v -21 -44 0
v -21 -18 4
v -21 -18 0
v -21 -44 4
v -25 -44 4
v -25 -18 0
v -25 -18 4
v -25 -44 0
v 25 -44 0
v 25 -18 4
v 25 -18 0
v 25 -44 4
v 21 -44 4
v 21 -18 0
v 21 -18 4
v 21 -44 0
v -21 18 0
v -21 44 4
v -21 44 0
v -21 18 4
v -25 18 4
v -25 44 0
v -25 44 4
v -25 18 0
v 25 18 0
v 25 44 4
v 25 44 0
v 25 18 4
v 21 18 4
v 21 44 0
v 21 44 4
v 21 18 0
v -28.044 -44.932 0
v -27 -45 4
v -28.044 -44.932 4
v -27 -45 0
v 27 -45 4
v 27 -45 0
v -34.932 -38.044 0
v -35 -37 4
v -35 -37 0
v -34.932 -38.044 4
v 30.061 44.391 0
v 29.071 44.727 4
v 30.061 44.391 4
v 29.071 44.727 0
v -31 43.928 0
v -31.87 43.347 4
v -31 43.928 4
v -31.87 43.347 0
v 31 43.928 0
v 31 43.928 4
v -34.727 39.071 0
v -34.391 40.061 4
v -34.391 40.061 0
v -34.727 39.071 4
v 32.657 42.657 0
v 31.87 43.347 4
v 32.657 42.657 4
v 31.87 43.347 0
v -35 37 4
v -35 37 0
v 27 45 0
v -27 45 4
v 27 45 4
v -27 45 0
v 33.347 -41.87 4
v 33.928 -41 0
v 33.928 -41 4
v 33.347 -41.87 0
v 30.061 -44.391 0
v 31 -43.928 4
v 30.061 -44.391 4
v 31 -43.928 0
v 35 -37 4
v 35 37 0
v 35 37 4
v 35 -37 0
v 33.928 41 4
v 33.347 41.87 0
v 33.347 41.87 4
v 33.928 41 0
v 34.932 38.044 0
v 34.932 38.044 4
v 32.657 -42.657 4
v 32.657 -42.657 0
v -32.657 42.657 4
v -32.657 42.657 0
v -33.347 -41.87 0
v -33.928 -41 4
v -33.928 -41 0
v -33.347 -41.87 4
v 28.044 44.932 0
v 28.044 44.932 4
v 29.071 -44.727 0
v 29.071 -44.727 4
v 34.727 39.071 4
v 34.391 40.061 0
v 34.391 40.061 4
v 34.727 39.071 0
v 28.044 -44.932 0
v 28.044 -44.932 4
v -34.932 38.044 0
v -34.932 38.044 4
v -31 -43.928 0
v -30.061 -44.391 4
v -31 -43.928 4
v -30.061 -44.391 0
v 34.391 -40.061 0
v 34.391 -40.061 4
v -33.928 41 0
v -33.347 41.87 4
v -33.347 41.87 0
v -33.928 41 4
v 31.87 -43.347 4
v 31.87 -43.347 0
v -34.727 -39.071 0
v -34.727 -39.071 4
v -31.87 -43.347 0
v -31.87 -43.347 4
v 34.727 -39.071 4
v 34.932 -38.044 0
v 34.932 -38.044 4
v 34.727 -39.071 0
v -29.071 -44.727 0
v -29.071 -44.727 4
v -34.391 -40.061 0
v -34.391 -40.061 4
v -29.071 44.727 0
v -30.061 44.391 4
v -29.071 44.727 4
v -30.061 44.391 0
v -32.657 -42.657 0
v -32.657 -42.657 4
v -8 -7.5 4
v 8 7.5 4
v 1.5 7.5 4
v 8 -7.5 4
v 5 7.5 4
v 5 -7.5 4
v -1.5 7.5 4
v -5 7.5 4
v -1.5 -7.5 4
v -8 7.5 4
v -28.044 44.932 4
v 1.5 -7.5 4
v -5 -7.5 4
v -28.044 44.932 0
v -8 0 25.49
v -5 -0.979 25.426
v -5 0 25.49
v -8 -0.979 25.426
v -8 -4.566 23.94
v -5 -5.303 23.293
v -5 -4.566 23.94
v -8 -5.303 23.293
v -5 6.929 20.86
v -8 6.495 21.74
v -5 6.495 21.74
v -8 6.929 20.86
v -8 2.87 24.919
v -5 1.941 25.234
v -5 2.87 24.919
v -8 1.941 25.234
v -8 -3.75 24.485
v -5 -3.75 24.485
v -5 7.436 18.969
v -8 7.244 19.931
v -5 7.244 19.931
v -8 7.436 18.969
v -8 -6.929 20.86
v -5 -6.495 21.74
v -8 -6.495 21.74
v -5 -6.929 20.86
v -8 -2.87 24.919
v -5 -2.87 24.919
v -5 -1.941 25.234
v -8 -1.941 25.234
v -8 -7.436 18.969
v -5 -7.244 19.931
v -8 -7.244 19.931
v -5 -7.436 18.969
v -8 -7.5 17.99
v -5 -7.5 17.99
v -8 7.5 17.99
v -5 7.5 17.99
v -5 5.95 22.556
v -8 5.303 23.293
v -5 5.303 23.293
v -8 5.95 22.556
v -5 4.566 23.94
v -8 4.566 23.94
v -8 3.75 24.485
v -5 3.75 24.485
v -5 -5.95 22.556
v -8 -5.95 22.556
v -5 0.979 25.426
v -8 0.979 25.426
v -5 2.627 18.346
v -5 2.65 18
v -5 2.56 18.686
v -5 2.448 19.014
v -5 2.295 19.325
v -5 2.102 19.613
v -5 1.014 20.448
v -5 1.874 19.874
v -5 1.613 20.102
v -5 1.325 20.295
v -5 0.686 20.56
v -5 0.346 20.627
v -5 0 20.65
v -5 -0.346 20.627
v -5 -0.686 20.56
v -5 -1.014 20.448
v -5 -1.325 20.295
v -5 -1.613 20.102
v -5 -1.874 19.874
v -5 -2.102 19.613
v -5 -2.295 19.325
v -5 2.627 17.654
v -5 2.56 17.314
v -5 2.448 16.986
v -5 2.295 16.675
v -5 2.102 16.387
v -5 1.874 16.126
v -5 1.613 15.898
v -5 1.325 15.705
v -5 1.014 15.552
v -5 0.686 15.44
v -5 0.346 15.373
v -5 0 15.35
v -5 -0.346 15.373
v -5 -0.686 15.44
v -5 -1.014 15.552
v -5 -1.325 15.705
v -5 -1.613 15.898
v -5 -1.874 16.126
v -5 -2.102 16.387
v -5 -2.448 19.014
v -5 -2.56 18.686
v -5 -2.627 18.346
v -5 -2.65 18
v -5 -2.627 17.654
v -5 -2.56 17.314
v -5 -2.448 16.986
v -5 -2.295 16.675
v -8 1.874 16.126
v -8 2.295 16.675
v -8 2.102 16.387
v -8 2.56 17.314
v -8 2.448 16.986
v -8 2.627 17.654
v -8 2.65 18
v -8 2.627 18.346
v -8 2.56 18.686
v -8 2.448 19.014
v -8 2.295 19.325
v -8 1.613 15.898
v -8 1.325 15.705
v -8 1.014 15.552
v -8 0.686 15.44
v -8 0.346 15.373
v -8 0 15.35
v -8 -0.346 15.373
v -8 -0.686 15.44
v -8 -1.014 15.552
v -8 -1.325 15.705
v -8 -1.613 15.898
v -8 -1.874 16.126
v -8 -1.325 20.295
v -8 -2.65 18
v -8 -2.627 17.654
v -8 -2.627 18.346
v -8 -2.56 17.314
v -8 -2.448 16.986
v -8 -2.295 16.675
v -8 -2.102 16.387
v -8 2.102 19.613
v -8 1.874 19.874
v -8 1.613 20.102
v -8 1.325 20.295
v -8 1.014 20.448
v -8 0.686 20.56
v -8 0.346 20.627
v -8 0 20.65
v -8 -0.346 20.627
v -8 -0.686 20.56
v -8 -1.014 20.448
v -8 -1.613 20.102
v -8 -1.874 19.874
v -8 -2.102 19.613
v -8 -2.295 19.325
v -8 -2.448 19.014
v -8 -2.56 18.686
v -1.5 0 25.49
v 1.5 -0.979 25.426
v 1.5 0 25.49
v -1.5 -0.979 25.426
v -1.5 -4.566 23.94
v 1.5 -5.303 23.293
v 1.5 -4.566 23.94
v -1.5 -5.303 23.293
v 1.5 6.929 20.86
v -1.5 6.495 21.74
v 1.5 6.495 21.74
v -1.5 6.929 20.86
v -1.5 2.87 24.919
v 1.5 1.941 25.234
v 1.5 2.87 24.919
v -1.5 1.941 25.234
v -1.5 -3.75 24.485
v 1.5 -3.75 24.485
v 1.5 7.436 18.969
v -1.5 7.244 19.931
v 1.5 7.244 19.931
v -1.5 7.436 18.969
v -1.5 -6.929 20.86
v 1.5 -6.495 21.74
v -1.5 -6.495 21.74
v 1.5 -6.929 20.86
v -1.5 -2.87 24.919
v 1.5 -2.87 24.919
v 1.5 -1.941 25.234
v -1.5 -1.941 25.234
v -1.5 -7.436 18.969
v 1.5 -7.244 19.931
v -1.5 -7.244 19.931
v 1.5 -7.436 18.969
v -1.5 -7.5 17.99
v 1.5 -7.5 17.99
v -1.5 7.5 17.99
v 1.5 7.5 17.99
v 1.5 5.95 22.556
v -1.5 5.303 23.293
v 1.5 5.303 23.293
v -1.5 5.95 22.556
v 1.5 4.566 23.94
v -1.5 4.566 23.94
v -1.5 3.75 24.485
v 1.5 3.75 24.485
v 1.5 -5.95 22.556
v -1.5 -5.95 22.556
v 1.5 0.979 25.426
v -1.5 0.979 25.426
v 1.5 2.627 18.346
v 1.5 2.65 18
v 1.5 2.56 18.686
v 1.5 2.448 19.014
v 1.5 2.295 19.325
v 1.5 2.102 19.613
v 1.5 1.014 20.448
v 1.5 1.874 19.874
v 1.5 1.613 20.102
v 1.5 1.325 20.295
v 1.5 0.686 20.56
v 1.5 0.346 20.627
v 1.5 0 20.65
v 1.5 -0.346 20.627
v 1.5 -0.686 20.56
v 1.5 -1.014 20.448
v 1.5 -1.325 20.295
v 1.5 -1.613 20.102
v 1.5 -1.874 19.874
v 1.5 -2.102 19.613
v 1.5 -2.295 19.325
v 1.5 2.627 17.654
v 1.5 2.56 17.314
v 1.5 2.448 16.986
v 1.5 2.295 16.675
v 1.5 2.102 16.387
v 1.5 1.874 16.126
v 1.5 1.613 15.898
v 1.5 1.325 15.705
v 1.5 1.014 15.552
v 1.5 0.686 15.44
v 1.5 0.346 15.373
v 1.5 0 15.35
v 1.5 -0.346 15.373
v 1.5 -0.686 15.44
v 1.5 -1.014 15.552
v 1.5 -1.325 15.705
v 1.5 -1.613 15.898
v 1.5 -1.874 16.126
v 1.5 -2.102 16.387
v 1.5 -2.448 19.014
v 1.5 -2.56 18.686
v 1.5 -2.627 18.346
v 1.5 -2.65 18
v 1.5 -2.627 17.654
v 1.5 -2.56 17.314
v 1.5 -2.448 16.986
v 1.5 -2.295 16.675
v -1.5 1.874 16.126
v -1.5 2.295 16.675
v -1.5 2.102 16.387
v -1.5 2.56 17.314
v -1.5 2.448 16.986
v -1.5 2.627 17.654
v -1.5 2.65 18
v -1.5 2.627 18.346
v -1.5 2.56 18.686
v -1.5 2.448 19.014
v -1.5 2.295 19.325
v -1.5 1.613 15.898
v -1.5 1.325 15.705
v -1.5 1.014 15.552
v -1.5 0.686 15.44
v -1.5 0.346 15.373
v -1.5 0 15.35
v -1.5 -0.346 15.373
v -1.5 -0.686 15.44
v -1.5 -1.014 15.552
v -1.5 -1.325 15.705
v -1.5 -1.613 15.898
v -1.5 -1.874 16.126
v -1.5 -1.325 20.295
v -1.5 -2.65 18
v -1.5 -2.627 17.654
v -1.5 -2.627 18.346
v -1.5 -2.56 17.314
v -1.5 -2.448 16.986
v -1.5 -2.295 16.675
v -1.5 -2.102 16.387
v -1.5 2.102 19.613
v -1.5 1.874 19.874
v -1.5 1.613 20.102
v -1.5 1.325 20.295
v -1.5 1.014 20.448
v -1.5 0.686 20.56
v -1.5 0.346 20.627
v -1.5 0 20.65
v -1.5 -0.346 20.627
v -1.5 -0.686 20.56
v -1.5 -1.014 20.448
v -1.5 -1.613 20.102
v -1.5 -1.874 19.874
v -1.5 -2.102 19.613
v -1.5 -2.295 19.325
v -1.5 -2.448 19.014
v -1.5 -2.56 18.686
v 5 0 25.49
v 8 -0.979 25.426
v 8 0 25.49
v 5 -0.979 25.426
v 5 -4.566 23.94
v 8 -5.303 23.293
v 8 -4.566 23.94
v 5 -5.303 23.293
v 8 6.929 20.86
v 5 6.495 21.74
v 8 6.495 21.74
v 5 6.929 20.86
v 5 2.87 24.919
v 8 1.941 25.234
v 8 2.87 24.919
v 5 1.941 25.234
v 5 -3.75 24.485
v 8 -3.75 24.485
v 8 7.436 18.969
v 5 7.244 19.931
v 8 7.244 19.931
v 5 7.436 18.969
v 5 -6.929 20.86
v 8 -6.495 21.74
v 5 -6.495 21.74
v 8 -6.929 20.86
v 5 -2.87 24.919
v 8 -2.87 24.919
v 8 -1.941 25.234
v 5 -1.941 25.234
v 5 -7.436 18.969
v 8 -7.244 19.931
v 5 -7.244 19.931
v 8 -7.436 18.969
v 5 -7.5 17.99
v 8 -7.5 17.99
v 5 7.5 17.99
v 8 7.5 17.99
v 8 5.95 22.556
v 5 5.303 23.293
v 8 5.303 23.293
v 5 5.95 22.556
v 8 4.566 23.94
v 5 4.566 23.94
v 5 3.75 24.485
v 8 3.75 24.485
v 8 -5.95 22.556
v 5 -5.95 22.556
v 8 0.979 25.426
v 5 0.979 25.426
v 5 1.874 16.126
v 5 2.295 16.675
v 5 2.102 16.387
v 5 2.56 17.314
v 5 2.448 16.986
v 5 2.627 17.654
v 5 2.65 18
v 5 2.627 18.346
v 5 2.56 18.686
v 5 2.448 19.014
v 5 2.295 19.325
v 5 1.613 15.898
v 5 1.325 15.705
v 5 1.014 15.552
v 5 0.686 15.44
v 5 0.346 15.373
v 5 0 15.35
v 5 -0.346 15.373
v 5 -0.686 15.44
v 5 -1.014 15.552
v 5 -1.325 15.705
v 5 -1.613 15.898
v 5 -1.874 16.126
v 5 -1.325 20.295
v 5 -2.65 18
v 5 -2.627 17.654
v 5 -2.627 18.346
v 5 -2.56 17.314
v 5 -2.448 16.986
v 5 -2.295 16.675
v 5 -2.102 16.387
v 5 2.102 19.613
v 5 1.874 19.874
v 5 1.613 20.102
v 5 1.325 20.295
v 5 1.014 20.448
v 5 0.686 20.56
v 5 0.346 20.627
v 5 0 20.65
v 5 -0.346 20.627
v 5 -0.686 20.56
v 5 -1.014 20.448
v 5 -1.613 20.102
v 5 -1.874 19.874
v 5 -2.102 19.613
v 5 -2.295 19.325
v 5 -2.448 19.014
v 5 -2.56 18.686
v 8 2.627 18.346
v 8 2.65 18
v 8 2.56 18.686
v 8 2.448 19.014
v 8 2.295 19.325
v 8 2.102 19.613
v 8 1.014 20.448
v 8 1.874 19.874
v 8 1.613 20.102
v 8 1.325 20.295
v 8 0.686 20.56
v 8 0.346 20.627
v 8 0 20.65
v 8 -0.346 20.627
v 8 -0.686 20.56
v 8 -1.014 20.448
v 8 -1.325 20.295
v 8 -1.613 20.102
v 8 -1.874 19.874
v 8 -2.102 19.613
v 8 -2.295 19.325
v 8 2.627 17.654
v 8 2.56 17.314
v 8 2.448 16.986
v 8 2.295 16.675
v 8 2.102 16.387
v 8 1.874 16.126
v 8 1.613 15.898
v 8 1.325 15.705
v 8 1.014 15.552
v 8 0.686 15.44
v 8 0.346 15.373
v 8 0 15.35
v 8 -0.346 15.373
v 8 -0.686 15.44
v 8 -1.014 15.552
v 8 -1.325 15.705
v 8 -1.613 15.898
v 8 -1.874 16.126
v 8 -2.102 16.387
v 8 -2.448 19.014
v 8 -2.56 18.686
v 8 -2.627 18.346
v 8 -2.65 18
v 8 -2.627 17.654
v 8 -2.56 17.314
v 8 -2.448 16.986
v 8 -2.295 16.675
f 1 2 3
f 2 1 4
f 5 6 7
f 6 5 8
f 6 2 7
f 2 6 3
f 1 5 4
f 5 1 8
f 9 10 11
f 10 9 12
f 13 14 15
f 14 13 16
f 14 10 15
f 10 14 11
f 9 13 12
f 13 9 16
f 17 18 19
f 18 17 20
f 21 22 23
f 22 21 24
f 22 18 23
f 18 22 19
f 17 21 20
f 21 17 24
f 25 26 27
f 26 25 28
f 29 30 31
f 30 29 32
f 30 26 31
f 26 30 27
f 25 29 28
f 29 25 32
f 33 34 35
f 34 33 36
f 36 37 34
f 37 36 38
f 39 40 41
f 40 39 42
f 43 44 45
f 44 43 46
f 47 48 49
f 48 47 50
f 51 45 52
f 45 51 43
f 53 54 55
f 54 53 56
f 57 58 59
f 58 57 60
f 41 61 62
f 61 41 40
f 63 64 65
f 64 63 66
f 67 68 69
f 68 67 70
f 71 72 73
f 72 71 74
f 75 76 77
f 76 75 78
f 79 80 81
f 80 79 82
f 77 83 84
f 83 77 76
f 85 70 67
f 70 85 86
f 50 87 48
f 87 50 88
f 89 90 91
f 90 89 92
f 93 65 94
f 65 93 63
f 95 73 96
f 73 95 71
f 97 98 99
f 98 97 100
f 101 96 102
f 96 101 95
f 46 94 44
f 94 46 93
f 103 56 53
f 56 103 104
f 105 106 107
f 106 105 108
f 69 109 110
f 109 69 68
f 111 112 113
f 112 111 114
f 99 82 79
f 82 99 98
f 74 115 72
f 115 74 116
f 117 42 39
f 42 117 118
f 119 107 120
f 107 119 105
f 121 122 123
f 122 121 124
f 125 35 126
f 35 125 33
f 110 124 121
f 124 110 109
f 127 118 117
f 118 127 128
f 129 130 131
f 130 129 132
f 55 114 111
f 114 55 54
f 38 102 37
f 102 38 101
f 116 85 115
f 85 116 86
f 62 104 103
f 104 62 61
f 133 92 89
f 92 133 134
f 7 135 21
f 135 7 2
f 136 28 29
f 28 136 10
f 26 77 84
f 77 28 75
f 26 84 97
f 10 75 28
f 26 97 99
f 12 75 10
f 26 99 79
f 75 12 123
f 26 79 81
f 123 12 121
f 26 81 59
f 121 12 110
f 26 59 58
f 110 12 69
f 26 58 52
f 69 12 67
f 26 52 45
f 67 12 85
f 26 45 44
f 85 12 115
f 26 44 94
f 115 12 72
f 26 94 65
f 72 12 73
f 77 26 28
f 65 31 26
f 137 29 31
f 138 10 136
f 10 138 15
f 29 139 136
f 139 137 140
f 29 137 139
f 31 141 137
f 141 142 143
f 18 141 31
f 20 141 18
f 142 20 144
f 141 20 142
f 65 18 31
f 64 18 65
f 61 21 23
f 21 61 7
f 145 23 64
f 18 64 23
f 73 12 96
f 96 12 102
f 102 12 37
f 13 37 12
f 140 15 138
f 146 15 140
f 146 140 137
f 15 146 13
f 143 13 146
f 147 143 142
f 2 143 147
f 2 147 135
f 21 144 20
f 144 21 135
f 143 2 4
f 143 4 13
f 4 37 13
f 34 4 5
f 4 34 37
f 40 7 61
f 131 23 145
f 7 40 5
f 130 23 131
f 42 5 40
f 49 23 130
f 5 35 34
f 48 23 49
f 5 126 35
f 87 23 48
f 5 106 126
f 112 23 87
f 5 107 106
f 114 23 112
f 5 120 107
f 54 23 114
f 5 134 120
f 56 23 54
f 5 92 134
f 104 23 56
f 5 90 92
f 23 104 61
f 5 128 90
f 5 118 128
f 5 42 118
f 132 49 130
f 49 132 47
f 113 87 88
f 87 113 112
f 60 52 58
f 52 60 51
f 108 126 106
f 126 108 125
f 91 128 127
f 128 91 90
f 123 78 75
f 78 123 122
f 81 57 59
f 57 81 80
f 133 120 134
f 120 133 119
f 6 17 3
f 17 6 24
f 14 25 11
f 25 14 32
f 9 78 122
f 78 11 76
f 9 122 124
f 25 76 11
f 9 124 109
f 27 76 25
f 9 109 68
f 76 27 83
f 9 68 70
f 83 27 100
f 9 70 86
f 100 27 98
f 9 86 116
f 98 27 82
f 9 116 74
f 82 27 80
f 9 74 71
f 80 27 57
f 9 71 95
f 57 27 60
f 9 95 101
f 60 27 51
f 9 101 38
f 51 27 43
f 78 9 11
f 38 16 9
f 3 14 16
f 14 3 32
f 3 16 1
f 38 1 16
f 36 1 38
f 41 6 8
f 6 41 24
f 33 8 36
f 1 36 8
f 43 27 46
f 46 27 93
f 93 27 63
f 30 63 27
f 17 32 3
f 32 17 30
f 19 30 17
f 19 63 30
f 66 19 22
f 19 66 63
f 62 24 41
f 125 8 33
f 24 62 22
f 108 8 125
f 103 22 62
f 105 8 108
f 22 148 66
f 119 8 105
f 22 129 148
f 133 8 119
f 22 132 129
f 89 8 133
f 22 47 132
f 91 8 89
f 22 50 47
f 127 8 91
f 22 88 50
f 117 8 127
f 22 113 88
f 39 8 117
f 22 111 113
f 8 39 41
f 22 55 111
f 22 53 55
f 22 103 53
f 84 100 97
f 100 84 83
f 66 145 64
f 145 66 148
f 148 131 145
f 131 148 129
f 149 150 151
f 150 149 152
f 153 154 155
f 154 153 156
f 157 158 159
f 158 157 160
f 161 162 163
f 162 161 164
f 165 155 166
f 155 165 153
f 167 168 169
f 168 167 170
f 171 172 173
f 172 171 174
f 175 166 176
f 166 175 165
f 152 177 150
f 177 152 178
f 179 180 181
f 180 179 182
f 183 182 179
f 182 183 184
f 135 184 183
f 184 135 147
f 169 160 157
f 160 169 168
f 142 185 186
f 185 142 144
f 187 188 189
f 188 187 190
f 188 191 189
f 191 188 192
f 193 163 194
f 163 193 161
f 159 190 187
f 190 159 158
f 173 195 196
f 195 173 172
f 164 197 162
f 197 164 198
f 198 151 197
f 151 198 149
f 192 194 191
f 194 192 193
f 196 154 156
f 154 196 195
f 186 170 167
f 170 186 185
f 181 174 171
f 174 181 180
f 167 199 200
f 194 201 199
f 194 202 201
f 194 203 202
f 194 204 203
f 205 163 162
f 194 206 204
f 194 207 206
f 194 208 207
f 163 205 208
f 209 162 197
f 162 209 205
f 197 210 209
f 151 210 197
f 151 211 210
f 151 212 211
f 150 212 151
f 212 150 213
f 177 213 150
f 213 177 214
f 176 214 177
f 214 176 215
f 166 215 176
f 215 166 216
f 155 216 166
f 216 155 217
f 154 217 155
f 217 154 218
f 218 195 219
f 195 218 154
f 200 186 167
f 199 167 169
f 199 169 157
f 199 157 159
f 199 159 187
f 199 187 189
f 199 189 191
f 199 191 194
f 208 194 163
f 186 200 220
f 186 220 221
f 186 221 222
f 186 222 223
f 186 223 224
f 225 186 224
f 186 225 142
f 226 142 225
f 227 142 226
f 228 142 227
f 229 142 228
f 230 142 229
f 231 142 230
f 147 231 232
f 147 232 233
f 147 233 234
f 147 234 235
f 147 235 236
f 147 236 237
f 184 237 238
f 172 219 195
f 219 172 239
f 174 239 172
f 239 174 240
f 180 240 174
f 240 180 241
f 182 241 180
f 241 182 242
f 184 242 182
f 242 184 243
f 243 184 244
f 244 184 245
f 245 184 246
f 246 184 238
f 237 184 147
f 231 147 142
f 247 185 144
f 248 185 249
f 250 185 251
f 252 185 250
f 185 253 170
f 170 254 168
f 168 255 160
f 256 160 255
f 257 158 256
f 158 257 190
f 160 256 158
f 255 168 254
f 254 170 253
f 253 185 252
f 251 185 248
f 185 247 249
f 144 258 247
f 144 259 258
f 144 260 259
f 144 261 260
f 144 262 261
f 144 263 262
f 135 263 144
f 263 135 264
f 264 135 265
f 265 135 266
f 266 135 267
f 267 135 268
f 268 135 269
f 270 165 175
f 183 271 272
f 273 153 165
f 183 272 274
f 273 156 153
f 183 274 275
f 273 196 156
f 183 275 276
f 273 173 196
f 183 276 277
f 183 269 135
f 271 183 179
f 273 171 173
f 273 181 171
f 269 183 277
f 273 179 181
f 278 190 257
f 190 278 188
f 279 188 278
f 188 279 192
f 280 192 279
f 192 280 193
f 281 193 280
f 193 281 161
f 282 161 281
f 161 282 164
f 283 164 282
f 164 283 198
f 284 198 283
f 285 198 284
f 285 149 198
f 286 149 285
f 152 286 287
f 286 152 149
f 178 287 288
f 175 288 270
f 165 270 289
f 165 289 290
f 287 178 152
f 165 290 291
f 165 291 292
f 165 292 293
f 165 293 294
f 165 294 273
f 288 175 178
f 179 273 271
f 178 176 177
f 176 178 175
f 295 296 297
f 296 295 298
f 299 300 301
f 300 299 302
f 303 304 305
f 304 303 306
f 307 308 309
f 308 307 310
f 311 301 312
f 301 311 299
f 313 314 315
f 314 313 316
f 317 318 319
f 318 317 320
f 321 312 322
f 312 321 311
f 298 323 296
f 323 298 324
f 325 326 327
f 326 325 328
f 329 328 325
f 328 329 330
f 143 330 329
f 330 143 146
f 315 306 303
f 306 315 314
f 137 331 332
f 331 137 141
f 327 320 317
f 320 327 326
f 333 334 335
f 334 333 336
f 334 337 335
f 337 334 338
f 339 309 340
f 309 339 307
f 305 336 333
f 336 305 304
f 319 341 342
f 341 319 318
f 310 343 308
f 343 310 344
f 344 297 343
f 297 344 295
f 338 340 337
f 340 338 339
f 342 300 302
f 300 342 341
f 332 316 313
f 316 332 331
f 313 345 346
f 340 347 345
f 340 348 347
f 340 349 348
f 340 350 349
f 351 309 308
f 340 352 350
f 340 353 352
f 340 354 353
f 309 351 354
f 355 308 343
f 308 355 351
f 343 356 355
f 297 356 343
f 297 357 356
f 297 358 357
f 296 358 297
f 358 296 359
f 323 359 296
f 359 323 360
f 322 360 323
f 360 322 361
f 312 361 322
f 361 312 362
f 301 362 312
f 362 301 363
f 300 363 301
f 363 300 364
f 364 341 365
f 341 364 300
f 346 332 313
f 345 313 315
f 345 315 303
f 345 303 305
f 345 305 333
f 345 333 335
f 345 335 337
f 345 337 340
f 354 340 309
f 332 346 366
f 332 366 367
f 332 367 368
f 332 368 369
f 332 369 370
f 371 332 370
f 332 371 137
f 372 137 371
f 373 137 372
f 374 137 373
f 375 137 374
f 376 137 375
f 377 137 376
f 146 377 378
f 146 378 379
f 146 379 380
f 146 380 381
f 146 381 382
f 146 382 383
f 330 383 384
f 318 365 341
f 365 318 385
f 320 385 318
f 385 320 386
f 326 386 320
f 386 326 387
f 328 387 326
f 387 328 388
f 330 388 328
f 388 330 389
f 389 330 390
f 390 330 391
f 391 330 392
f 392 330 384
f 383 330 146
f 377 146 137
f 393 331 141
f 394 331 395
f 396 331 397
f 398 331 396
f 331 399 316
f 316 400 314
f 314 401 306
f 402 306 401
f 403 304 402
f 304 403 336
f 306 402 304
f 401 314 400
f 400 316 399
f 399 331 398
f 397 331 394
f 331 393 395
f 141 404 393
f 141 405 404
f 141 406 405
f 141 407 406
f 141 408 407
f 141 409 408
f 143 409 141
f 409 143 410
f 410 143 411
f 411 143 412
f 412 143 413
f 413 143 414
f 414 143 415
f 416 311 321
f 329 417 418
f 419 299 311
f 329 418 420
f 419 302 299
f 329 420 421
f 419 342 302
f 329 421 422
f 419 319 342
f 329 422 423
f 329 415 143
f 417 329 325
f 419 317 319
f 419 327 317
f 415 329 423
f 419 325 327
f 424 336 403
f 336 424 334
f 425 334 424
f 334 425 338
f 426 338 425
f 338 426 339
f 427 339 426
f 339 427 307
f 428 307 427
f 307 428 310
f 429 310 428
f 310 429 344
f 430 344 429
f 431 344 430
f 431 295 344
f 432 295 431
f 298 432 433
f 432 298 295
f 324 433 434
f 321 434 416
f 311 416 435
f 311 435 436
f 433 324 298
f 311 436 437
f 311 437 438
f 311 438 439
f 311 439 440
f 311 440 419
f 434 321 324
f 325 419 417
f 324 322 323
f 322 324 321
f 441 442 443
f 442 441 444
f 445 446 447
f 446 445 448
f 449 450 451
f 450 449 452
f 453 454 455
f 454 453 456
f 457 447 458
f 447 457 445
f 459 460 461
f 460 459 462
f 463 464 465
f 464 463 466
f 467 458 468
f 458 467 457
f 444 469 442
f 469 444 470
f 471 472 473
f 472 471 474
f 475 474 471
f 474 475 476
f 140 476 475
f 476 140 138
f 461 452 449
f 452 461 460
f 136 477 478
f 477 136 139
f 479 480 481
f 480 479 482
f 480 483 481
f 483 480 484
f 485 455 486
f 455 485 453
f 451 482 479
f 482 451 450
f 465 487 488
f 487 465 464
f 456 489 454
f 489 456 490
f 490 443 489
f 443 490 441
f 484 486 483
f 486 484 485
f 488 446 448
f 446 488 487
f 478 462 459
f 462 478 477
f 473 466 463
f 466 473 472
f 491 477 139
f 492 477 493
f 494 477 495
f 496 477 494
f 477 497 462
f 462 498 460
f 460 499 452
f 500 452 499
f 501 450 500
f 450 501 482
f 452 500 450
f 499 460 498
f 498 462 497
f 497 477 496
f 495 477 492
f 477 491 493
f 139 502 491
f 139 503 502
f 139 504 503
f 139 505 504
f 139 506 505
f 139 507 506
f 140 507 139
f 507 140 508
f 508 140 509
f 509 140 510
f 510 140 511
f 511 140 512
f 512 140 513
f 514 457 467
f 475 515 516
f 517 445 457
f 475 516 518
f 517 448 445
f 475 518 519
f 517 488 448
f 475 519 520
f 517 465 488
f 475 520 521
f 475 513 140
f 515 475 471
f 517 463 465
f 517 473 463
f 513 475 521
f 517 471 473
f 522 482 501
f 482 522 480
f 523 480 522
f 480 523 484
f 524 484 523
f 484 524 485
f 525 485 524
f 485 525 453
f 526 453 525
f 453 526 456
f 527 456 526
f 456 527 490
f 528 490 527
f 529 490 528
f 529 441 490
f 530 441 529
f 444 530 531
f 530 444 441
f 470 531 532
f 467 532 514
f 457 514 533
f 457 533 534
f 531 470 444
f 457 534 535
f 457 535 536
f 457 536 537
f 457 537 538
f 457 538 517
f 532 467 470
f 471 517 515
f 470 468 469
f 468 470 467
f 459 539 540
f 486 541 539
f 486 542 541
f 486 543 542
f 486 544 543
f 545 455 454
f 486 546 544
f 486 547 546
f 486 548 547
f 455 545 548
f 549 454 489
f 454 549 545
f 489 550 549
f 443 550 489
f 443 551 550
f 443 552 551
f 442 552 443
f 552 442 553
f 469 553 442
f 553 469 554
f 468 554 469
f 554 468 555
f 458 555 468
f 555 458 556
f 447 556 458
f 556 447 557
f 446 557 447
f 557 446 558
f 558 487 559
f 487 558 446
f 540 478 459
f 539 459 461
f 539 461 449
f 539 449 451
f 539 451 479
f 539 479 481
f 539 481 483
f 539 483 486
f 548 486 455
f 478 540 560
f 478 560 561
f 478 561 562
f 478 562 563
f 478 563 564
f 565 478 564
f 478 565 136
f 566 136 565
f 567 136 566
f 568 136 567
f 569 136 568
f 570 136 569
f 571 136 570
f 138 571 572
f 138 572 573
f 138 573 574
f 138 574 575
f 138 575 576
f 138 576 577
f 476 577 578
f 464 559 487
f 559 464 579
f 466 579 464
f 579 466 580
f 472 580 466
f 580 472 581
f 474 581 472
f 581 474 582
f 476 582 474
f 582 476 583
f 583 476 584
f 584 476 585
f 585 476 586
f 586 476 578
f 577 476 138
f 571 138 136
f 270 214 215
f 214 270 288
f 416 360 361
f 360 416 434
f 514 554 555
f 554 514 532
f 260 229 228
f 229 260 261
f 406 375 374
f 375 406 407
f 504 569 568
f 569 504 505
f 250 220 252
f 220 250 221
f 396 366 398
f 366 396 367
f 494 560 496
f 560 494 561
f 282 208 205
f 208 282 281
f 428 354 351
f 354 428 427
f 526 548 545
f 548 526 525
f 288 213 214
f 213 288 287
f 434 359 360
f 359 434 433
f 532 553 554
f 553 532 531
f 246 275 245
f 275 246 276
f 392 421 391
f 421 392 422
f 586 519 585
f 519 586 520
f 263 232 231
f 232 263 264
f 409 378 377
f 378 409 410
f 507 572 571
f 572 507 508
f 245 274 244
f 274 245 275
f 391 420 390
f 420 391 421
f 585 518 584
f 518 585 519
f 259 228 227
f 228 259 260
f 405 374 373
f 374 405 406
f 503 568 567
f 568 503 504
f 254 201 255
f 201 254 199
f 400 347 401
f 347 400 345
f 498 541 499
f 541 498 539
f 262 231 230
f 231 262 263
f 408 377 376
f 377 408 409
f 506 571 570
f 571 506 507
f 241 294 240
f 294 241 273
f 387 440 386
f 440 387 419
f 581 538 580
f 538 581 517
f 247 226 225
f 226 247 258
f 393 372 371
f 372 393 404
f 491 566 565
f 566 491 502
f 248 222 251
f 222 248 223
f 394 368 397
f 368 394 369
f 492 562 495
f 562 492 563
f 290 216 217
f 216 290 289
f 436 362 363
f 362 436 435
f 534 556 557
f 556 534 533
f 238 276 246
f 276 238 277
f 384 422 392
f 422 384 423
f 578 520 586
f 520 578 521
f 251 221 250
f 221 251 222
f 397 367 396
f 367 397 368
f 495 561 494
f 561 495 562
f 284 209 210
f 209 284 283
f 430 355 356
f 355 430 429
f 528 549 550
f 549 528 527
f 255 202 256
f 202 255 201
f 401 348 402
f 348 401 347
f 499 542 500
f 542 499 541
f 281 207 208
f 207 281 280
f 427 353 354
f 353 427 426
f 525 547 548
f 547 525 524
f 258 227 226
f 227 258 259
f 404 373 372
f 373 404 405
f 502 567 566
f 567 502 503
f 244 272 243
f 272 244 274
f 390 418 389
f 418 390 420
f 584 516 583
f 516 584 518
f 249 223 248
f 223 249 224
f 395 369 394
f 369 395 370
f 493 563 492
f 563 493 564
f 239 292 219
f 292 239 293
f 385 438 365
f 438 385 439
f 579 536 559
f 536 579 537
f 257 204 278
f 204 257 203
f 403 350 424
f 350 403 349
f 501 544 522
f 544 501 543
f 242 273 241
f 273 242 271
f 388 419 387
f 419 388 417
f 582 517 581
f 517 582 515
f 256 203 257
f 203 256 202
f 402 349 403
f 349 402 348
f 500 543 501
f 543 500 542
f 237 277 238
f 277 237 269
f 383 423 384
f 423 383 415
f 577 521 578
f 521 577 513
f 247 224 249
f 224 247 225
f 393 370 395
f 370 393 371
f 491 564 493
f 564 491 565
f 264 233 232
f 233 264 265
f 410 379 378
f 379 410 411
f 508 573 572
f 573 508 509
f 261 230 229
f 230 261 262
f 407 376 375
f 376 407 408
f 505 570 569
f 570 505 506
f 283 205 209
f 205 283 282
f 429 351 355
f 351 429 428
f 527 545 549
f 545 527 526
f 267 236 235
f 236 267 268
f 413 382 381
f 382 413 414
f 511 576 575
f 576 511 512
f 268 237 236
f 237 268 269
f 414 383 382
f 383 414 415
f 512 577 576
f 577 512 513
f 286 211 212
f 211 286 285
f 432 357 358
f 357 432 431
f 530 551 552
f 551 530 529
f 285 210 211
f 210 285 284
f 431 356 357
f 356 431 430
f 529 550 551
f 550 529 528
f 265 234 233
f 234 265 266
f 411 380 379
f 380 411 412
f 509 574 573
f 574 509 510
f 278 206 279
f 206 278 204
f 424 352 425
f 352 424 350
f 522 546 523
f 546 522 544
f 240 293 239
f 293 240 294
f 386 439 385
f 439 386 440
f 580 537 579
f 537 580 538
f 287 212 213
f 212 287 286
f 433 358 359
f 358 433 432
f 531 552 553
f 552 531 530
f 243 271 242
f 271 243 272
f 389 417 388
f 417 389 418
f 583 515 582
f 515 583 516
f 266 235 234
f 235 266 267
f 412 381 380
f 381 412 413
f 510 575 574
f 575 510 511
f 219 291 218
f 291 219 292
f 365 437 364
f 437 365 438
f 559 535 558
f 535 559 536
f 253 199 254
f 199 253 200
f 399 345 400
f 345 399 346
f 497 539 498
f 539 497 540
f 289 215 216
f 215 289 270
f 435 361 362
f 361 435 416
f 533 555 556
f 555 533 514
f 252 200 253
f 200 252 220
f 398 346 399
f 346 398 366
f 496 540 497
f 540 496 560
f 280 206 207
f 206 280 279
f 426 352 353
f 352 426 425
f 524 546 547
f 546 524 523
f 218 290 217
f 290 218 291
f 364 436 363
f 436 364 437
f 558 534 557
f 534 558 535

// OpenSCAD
// chest_plate.scad — flat chest/lanyard plate with a GoPro-style 3-prong mount
// so the jackw01 phone clamp (2-prong male) snaps on. Hedge against motion blur on the cane.
// DRAFT: unrendered. Check prong spacing against your printed phone clamp before relying on it.
// Print: flat, PETG, no supports.
// LEGACY (ESP32 era, cut when the app went phone-only): do not print for the demo.
// Sized for a 12.7 mm aluminium/graphite shaft; the prototype stick is 27.65 mm (measured
// so nothing here fits it. The live mount is hardware/mount_screwless/ (see
// cad/README.md and hardware/README.md). Not rendered by any script (scripts/build_stl.ps1 covers
// hardware/ only); no tests; no owner on the current team. Units: millimetres throughout.
// Why it existed: the plan's hedge if the phone on the cane blurred too much — the same GoPro-knuckle
// phone holder snaps onto the chest instead (a 2025 study measured cane-mounted
// camera tracking at 55-58 % outdoors vs > 98 % head-mounted). Never printed or tested; the
// phone-only app assumes the cane mount.

// Circle facets for every cylinder in this file.
$fn = 48;
// Plate outline (width, height, thickness, corner radius), mm.
plate_w = 70; plate_h = 90; plate_t = 4; corner_r = 8;
// Four strap slots: slot length (a 25 mm webbing strap passes through it) and slot width, mm.
slot_w = 26; slot_h = 4;      // 25 mm webbing
// GoPro-style prongs: thickness, gap between prongs, height to the bolt axis, rounded-end radius,
// and the clearance hole for the M5 thumb screw. Unverified against a real GoPro accessory.
prong_t = 3; prong_gap = 3.5; prong_h = 14; prong_r = 7.5; bolt_d = 5.3;
prongs = 3;                   // 3 = base (female) mates with 2-prong accessories

// Rounded-rectangle base plate lying on z = 0.
module plate() {
    hull() for (x = [-1,1], y = [-1,1])
        translate([x*(plate_w/2 - corner_r), y*(plate_h/2 - corner_r), 0]) cylinder(r = corner_r, h = plate_t);
}
// Through-cutters for the four strap slots, two near each long edge.
module slots() {
    for (y = [-1, 1]) for (x = [-1, 1])
        translate([x*(plate_w/2 - 12) - slot_h/2, y*(plate_h/2 - 14) - slot_w/2, -1])
            cube([slot_h, slot_w, plate_t + 2]);
}
// The prongs standing on the plate's top face, with the shared bolt hole through their rounded ends.
module prong_set() {
    total = prongs*prong_t + (prongs-1)*prong_gap;
    difference() {
        union() for (i = [0:prongs-1])
            translate([-total/2 + i*(prong_t + prong_gap), 0, plate_t - 0.01])
                hull() {
                    translate([0, -prong_r, 0]) cube([prong_t, 2*prong_r, 0.01]);
                    translate([0, 0, prong_h]) rotate([0, 90, 0]) cylinder(r = prong_r, h = prong_t);
                }
        translate([-total/2 - 1, 0, plate_t + prong_h]) rotate([0, 90, 0]) cylinder(d = bolt_d, h = total + 2);
    }
}
difference() { plate(); slots(); }
prong_set();
